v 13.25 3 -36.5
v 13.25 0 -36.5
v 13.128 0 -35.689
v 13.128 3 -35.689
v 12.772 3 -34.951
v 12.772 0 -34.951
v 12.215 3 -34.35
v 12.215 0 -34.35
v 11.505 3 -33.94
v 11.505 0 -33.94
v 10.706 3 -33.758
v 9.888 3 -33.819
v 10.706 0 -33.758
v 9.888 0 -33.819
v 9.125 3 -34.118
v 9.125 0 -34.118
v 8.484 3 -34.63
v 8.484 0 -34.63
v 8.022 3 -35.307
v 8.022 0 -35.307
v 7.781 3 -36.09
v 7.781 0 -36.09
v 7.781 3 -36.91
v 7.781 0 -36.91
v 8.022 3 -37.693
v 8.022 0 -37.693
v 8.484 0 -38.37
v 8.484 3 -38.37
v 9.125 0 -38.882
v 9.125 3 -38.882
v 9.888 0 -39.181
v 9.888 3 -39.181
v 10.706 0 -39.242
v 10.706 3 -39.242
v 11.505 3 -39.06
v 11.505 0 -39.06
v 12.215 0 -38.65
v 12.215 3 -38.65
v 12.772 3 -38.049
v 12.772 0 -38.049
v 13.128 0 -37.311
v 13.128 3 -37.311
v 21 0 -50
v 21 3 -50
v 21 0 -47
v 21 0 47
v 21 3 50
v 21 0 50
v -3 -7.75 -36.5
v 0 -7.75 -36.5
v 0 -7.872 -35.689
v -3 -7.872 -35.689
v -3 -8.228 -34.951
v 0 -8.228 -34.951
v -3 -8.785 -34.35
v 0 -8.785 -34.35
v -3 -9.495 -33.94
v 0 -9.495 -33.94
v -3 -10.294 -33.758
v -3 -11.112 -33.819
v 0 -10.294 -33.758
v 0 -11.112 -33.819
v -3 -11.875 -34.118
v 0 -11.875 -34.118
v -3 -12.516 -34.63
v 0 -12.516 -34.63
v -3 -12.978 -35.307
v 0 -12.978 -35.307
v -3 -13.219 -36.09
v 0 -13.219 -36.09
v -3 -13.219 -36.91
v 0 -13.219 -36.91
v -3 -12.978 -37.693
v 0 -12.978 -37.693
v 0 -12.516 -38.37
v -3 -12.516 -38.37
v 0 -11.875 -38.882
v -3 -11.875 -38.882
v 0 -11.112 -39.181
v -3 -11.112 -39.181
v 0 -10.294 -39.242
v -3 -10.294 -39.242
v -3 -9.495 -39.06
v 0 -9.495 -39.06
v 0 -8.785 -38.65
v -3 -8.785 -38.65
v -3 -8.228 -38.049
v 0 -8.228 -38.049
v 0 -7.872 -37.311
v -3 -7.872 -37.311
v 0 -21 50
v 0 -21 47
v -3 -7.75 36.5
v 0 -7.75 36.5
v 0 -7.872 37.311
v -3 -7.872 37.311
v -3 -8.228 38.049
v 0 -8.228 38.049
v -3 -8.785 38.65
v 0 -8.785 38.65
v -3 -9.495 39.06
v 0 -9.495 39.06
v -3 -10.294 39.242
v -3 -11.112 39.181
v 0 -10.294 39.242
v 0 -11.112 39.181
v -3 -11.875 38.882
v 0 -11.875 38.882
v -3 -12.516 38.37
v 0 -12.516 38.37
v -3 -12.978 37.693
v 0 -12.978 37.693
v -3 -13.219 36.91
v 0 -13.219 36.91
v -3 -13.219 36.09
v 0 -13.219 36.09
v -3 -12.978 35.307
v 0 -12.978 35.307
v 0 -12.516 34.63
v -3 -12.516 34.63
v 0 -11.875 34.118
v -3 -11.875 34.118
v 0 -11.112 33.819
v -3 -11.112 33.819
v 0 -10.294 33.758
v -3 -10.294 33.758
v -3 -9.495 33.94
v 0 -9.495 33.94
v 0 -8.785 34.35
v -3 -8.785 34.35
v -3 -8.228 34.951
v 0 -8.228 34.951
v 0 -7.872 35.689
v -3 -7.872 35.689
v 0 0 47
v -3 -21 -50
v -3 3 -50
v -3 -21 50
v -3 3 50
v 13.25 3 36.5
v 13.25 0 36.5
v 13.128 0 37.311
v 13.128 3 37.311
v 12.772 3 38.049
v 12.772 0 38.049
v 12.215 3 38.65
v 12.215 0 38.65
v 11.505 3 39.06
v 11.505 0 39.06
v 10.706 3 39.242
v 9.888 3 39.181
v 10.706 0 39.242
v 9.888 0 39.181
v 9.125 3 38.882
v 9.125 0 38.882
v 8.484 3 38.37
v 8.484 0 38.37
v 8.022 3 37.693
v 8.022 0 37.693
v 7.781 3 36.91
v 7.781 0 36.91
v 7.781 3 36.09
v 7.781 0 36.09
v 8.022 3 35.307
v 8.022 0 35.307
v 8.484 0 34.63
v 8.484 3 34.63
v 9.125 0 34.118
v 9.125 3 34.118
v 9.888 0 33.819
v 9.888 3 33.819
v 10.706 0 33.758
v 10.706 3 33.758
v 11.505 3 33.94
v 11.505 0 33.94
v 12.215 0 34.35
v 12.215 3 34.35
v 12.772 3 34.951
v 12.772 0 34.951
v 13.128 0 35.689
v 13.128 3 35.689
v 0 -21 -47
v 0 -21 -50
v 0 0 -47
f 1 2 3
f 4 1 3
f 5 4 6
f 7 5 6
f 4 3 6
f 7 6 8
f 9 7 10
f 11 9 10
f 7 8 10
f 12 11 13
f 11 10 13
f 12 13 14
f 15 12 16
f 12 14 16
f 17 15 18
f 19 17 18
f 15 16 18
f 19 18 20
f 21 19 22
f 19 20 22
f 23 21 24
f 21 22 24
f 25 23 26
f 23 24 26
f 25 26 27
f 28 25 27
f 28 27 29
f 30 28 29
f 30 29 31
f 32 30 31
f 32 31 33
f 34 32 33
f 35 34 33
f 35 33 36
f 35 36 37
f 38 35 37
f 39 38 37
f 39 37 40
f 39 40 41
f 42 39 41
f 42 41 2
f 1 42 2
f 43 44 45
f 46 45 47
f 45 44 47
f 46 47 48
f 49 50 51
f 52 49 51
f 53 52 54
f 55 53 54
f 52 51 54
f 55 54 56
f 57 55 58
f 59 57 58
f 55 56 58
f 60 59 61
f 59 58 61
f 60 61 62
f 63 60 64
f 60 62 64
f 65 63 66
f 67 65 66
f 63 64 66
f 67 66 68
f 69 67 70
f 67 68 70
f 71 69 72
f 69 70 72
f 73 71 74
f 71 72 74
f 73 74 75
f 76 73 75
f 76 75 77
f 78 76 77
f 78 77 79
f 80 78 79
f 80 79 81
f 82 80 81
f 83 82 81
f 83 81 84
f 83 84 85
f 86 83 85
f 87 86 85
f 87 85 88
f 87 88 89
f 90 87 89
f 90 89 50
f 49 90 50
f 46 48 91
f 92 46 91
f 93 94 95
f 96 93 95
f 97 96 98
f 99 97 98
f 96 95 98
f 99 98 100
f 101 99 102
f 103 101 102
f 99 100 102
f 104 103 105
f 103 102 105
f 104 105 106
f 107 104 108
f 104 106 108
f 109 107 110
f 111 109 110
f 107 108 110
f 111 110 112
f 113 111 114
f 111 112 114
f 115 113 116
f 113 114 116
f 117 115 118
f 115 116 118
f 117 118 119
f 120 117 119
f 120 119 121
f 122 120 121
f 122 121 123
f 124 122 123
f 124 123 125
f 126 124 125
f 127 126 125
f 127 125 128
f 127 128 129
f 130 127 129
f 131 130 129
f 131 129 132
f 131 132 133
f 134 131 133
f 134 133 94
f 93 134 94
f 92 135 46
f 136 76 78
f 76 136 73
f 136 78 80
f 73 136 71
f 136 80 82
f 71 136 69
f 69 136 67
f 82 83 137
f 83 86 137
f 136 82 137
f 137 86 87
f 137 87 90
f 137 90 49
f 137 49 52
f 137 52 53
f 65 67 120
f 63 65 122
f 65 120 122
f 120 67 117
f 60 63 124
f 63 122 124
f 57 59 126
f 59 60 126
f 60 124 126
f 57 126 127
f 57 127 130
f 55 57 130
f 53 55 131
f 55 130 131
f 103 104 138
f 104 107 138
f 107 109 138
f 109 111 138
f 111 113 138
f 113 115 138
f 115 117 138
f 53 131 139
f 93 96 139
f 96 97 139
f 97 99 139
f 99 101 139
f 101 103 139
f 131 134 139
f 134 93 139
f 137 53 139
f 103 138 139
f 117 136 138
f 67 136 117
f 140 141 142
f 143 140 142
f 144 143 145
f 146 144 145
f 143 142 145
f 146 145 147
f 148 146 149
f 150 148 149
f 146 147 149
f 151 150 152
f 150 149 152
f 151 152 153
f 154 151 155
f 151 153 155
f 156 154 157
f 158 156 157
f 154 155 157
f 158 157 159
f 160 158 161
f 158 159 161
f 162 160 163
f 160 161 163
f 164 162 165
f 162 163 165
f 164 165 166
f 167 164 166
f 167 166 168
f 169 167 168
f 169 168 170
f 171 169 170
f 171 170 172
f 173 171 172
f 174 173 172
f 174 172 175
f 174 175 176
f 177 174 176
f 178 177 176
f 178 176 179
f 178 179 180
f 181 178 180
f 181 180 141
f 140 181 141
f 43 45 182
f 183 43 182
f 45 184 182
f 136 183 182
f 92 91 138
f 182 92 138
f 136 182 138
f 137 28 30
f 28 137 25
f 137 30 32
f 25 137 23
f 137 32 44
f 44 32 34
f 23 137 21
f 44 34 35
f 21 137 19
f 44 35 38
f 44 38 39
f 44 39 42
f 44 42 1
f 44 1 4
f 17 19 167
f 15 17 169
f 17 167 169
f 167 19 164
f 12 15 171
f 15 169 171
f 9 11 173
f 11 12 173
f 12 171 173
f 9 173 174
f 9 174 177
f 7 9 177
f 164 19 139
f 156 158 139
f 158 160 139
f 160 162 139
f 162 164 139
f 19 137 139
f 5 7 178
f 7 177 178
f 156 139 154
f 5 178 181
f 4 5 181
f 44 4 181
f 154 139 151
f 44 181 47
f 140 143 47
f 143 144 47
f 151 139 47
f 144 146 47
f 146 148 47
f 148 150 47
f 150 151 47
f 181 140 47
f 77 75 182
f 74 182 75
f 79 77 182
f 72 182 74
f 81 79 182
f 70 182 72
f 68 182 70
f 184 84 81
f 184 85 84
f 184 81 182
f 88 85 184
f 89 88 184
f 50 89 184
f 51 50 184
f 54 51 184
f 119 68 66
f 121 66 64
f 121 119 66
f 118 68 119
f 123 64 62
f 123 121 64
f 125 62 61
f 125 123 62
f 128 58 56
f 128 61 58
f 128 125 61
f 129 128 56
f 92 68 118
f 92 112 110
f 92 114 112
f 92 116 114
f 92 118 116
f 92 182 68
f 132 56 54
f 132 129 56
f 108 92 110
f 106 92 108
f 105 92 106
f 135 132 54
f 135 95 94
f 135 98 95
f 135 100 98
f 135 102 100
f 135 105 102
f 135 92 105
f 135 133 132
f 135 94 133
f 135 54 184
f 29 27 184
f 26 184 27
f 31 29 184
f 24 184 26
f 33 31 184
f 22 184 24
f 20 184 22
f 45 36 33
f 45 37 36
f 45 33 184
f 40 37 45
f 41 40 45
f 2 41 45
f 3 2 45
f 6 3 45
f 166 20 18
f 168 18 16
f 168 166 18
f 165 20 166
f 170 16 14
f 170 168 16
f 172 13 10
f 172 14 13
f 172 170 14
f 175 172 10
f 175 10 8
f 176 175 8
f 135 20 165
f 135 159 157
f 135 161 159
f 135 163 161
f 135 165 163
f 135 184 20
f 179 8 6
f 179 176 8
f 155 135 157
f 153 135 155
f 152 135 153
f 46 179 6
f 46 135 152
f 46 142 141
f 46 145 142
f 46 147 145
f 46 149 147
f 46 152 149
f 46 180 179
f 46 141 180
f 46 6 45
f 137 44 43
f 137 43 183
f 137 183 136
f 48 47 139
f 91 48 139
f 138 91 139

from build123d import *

# Parameters (mm, degrees)
PAD_DEPTH     = 50
SKETCH001_W   = 24
SKETCH001_H   = 24
POCKET_DEPTH  = 47
SKETCH002_R   = 2.75
HOLE_DEPTH    = 3.001
SKETCH003_R   = 2.75
HOLE001_DEPTH = 3.001


with BuildPart() as part:
    # Sketch → Pad (new body, symmetric)
    with BuildSketch(Plane.XY):
        Polygon((-3, 3), (21, 3), (21, 0), (0, -21), (-3, -21), align=None)
    extrude(amount=PAD_DEPTH, both=True)

    # Sketch001 → Pocket (cut, symmetric)
    with BuildSketch(Plane.XY):
        with Locations((12, -12)):
            Rectangle(SKETCH001_W, SKETCH001_H)
    extrude(amount=POCKET_DEPTH, both=True, mode=Mode.SUBTRACT)

    # Sketch002 → Hole (cut, through all)
    with BuildSketch(Plane.YZ):
        with Locations((-10.5, 36.5)):
            Circle(SKETCH002_R)
        with Locations((-10.5, -36.5)):
            Circle(SKETCH002_R)
    extrude(amount=-HOLE_DEPTH, mode=Mode.SUBTRACT)

    # Sketch003 → Hole001 (cut, through all)
    with BuildSketch(Plane.XZ):
        with Locations((10.5, 36.5)):
            Circle(SKETCH003_R)
        with Locations((10.5, -36.5)):
            Circle(SKETCH003_R)
    extrude(amount=-HOLE001_DEPTH, mode=Mode.SUBTRACT)


solid = part.part
